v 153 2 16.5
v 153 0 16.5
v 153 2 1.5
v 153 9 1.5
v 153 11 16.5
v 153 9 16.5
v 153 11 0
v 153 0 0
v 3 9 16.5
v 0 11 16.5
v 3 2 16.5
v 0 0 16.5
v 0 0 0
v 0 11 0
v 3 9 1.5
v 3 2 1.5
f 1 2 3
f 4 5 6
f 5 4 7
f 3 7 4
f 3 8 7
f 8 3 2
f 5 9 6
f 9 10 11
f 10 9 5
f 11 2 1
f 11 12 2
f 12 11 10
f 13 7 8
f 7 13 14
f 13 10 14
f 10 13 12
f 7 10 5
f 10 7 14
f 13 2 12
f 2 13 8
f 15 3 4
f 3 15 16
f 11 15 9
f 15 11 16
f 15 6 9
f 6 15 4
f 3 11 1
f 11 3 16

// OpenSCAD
/**
 * eink-tablet-holder.scad
 * Holding rails for a Silvercrest HG06333C writing tablet. This
 * is meant to be printed as a pair and mounted to the side of a
 * cabinet where the tablet can be slid into.
 *
 * @author Nathan Campos <nathan@innoveworkshop.com>
 */

// Tablet dimensions.
tw = 150;  // Tablet width.
td = 6;    // Tablet depth.

// Feature dimensions.
ch = 15;  // Channel height.
sw = 3;   // Stop width.

// Mechanical dimensions.
fh = 1.5;  // Floor height.
wd = 2;    // Wall depth.
cs = 1;    // Channel slop.

difference() {
	// Main body.
	cube([tw + sw, td + (wd * 2) + cs, ch + fh]);

	// Slot cutout.
	translate([sw, wd, fh])
		cube([tw + 1, td + cs, ch + 1]);
}
